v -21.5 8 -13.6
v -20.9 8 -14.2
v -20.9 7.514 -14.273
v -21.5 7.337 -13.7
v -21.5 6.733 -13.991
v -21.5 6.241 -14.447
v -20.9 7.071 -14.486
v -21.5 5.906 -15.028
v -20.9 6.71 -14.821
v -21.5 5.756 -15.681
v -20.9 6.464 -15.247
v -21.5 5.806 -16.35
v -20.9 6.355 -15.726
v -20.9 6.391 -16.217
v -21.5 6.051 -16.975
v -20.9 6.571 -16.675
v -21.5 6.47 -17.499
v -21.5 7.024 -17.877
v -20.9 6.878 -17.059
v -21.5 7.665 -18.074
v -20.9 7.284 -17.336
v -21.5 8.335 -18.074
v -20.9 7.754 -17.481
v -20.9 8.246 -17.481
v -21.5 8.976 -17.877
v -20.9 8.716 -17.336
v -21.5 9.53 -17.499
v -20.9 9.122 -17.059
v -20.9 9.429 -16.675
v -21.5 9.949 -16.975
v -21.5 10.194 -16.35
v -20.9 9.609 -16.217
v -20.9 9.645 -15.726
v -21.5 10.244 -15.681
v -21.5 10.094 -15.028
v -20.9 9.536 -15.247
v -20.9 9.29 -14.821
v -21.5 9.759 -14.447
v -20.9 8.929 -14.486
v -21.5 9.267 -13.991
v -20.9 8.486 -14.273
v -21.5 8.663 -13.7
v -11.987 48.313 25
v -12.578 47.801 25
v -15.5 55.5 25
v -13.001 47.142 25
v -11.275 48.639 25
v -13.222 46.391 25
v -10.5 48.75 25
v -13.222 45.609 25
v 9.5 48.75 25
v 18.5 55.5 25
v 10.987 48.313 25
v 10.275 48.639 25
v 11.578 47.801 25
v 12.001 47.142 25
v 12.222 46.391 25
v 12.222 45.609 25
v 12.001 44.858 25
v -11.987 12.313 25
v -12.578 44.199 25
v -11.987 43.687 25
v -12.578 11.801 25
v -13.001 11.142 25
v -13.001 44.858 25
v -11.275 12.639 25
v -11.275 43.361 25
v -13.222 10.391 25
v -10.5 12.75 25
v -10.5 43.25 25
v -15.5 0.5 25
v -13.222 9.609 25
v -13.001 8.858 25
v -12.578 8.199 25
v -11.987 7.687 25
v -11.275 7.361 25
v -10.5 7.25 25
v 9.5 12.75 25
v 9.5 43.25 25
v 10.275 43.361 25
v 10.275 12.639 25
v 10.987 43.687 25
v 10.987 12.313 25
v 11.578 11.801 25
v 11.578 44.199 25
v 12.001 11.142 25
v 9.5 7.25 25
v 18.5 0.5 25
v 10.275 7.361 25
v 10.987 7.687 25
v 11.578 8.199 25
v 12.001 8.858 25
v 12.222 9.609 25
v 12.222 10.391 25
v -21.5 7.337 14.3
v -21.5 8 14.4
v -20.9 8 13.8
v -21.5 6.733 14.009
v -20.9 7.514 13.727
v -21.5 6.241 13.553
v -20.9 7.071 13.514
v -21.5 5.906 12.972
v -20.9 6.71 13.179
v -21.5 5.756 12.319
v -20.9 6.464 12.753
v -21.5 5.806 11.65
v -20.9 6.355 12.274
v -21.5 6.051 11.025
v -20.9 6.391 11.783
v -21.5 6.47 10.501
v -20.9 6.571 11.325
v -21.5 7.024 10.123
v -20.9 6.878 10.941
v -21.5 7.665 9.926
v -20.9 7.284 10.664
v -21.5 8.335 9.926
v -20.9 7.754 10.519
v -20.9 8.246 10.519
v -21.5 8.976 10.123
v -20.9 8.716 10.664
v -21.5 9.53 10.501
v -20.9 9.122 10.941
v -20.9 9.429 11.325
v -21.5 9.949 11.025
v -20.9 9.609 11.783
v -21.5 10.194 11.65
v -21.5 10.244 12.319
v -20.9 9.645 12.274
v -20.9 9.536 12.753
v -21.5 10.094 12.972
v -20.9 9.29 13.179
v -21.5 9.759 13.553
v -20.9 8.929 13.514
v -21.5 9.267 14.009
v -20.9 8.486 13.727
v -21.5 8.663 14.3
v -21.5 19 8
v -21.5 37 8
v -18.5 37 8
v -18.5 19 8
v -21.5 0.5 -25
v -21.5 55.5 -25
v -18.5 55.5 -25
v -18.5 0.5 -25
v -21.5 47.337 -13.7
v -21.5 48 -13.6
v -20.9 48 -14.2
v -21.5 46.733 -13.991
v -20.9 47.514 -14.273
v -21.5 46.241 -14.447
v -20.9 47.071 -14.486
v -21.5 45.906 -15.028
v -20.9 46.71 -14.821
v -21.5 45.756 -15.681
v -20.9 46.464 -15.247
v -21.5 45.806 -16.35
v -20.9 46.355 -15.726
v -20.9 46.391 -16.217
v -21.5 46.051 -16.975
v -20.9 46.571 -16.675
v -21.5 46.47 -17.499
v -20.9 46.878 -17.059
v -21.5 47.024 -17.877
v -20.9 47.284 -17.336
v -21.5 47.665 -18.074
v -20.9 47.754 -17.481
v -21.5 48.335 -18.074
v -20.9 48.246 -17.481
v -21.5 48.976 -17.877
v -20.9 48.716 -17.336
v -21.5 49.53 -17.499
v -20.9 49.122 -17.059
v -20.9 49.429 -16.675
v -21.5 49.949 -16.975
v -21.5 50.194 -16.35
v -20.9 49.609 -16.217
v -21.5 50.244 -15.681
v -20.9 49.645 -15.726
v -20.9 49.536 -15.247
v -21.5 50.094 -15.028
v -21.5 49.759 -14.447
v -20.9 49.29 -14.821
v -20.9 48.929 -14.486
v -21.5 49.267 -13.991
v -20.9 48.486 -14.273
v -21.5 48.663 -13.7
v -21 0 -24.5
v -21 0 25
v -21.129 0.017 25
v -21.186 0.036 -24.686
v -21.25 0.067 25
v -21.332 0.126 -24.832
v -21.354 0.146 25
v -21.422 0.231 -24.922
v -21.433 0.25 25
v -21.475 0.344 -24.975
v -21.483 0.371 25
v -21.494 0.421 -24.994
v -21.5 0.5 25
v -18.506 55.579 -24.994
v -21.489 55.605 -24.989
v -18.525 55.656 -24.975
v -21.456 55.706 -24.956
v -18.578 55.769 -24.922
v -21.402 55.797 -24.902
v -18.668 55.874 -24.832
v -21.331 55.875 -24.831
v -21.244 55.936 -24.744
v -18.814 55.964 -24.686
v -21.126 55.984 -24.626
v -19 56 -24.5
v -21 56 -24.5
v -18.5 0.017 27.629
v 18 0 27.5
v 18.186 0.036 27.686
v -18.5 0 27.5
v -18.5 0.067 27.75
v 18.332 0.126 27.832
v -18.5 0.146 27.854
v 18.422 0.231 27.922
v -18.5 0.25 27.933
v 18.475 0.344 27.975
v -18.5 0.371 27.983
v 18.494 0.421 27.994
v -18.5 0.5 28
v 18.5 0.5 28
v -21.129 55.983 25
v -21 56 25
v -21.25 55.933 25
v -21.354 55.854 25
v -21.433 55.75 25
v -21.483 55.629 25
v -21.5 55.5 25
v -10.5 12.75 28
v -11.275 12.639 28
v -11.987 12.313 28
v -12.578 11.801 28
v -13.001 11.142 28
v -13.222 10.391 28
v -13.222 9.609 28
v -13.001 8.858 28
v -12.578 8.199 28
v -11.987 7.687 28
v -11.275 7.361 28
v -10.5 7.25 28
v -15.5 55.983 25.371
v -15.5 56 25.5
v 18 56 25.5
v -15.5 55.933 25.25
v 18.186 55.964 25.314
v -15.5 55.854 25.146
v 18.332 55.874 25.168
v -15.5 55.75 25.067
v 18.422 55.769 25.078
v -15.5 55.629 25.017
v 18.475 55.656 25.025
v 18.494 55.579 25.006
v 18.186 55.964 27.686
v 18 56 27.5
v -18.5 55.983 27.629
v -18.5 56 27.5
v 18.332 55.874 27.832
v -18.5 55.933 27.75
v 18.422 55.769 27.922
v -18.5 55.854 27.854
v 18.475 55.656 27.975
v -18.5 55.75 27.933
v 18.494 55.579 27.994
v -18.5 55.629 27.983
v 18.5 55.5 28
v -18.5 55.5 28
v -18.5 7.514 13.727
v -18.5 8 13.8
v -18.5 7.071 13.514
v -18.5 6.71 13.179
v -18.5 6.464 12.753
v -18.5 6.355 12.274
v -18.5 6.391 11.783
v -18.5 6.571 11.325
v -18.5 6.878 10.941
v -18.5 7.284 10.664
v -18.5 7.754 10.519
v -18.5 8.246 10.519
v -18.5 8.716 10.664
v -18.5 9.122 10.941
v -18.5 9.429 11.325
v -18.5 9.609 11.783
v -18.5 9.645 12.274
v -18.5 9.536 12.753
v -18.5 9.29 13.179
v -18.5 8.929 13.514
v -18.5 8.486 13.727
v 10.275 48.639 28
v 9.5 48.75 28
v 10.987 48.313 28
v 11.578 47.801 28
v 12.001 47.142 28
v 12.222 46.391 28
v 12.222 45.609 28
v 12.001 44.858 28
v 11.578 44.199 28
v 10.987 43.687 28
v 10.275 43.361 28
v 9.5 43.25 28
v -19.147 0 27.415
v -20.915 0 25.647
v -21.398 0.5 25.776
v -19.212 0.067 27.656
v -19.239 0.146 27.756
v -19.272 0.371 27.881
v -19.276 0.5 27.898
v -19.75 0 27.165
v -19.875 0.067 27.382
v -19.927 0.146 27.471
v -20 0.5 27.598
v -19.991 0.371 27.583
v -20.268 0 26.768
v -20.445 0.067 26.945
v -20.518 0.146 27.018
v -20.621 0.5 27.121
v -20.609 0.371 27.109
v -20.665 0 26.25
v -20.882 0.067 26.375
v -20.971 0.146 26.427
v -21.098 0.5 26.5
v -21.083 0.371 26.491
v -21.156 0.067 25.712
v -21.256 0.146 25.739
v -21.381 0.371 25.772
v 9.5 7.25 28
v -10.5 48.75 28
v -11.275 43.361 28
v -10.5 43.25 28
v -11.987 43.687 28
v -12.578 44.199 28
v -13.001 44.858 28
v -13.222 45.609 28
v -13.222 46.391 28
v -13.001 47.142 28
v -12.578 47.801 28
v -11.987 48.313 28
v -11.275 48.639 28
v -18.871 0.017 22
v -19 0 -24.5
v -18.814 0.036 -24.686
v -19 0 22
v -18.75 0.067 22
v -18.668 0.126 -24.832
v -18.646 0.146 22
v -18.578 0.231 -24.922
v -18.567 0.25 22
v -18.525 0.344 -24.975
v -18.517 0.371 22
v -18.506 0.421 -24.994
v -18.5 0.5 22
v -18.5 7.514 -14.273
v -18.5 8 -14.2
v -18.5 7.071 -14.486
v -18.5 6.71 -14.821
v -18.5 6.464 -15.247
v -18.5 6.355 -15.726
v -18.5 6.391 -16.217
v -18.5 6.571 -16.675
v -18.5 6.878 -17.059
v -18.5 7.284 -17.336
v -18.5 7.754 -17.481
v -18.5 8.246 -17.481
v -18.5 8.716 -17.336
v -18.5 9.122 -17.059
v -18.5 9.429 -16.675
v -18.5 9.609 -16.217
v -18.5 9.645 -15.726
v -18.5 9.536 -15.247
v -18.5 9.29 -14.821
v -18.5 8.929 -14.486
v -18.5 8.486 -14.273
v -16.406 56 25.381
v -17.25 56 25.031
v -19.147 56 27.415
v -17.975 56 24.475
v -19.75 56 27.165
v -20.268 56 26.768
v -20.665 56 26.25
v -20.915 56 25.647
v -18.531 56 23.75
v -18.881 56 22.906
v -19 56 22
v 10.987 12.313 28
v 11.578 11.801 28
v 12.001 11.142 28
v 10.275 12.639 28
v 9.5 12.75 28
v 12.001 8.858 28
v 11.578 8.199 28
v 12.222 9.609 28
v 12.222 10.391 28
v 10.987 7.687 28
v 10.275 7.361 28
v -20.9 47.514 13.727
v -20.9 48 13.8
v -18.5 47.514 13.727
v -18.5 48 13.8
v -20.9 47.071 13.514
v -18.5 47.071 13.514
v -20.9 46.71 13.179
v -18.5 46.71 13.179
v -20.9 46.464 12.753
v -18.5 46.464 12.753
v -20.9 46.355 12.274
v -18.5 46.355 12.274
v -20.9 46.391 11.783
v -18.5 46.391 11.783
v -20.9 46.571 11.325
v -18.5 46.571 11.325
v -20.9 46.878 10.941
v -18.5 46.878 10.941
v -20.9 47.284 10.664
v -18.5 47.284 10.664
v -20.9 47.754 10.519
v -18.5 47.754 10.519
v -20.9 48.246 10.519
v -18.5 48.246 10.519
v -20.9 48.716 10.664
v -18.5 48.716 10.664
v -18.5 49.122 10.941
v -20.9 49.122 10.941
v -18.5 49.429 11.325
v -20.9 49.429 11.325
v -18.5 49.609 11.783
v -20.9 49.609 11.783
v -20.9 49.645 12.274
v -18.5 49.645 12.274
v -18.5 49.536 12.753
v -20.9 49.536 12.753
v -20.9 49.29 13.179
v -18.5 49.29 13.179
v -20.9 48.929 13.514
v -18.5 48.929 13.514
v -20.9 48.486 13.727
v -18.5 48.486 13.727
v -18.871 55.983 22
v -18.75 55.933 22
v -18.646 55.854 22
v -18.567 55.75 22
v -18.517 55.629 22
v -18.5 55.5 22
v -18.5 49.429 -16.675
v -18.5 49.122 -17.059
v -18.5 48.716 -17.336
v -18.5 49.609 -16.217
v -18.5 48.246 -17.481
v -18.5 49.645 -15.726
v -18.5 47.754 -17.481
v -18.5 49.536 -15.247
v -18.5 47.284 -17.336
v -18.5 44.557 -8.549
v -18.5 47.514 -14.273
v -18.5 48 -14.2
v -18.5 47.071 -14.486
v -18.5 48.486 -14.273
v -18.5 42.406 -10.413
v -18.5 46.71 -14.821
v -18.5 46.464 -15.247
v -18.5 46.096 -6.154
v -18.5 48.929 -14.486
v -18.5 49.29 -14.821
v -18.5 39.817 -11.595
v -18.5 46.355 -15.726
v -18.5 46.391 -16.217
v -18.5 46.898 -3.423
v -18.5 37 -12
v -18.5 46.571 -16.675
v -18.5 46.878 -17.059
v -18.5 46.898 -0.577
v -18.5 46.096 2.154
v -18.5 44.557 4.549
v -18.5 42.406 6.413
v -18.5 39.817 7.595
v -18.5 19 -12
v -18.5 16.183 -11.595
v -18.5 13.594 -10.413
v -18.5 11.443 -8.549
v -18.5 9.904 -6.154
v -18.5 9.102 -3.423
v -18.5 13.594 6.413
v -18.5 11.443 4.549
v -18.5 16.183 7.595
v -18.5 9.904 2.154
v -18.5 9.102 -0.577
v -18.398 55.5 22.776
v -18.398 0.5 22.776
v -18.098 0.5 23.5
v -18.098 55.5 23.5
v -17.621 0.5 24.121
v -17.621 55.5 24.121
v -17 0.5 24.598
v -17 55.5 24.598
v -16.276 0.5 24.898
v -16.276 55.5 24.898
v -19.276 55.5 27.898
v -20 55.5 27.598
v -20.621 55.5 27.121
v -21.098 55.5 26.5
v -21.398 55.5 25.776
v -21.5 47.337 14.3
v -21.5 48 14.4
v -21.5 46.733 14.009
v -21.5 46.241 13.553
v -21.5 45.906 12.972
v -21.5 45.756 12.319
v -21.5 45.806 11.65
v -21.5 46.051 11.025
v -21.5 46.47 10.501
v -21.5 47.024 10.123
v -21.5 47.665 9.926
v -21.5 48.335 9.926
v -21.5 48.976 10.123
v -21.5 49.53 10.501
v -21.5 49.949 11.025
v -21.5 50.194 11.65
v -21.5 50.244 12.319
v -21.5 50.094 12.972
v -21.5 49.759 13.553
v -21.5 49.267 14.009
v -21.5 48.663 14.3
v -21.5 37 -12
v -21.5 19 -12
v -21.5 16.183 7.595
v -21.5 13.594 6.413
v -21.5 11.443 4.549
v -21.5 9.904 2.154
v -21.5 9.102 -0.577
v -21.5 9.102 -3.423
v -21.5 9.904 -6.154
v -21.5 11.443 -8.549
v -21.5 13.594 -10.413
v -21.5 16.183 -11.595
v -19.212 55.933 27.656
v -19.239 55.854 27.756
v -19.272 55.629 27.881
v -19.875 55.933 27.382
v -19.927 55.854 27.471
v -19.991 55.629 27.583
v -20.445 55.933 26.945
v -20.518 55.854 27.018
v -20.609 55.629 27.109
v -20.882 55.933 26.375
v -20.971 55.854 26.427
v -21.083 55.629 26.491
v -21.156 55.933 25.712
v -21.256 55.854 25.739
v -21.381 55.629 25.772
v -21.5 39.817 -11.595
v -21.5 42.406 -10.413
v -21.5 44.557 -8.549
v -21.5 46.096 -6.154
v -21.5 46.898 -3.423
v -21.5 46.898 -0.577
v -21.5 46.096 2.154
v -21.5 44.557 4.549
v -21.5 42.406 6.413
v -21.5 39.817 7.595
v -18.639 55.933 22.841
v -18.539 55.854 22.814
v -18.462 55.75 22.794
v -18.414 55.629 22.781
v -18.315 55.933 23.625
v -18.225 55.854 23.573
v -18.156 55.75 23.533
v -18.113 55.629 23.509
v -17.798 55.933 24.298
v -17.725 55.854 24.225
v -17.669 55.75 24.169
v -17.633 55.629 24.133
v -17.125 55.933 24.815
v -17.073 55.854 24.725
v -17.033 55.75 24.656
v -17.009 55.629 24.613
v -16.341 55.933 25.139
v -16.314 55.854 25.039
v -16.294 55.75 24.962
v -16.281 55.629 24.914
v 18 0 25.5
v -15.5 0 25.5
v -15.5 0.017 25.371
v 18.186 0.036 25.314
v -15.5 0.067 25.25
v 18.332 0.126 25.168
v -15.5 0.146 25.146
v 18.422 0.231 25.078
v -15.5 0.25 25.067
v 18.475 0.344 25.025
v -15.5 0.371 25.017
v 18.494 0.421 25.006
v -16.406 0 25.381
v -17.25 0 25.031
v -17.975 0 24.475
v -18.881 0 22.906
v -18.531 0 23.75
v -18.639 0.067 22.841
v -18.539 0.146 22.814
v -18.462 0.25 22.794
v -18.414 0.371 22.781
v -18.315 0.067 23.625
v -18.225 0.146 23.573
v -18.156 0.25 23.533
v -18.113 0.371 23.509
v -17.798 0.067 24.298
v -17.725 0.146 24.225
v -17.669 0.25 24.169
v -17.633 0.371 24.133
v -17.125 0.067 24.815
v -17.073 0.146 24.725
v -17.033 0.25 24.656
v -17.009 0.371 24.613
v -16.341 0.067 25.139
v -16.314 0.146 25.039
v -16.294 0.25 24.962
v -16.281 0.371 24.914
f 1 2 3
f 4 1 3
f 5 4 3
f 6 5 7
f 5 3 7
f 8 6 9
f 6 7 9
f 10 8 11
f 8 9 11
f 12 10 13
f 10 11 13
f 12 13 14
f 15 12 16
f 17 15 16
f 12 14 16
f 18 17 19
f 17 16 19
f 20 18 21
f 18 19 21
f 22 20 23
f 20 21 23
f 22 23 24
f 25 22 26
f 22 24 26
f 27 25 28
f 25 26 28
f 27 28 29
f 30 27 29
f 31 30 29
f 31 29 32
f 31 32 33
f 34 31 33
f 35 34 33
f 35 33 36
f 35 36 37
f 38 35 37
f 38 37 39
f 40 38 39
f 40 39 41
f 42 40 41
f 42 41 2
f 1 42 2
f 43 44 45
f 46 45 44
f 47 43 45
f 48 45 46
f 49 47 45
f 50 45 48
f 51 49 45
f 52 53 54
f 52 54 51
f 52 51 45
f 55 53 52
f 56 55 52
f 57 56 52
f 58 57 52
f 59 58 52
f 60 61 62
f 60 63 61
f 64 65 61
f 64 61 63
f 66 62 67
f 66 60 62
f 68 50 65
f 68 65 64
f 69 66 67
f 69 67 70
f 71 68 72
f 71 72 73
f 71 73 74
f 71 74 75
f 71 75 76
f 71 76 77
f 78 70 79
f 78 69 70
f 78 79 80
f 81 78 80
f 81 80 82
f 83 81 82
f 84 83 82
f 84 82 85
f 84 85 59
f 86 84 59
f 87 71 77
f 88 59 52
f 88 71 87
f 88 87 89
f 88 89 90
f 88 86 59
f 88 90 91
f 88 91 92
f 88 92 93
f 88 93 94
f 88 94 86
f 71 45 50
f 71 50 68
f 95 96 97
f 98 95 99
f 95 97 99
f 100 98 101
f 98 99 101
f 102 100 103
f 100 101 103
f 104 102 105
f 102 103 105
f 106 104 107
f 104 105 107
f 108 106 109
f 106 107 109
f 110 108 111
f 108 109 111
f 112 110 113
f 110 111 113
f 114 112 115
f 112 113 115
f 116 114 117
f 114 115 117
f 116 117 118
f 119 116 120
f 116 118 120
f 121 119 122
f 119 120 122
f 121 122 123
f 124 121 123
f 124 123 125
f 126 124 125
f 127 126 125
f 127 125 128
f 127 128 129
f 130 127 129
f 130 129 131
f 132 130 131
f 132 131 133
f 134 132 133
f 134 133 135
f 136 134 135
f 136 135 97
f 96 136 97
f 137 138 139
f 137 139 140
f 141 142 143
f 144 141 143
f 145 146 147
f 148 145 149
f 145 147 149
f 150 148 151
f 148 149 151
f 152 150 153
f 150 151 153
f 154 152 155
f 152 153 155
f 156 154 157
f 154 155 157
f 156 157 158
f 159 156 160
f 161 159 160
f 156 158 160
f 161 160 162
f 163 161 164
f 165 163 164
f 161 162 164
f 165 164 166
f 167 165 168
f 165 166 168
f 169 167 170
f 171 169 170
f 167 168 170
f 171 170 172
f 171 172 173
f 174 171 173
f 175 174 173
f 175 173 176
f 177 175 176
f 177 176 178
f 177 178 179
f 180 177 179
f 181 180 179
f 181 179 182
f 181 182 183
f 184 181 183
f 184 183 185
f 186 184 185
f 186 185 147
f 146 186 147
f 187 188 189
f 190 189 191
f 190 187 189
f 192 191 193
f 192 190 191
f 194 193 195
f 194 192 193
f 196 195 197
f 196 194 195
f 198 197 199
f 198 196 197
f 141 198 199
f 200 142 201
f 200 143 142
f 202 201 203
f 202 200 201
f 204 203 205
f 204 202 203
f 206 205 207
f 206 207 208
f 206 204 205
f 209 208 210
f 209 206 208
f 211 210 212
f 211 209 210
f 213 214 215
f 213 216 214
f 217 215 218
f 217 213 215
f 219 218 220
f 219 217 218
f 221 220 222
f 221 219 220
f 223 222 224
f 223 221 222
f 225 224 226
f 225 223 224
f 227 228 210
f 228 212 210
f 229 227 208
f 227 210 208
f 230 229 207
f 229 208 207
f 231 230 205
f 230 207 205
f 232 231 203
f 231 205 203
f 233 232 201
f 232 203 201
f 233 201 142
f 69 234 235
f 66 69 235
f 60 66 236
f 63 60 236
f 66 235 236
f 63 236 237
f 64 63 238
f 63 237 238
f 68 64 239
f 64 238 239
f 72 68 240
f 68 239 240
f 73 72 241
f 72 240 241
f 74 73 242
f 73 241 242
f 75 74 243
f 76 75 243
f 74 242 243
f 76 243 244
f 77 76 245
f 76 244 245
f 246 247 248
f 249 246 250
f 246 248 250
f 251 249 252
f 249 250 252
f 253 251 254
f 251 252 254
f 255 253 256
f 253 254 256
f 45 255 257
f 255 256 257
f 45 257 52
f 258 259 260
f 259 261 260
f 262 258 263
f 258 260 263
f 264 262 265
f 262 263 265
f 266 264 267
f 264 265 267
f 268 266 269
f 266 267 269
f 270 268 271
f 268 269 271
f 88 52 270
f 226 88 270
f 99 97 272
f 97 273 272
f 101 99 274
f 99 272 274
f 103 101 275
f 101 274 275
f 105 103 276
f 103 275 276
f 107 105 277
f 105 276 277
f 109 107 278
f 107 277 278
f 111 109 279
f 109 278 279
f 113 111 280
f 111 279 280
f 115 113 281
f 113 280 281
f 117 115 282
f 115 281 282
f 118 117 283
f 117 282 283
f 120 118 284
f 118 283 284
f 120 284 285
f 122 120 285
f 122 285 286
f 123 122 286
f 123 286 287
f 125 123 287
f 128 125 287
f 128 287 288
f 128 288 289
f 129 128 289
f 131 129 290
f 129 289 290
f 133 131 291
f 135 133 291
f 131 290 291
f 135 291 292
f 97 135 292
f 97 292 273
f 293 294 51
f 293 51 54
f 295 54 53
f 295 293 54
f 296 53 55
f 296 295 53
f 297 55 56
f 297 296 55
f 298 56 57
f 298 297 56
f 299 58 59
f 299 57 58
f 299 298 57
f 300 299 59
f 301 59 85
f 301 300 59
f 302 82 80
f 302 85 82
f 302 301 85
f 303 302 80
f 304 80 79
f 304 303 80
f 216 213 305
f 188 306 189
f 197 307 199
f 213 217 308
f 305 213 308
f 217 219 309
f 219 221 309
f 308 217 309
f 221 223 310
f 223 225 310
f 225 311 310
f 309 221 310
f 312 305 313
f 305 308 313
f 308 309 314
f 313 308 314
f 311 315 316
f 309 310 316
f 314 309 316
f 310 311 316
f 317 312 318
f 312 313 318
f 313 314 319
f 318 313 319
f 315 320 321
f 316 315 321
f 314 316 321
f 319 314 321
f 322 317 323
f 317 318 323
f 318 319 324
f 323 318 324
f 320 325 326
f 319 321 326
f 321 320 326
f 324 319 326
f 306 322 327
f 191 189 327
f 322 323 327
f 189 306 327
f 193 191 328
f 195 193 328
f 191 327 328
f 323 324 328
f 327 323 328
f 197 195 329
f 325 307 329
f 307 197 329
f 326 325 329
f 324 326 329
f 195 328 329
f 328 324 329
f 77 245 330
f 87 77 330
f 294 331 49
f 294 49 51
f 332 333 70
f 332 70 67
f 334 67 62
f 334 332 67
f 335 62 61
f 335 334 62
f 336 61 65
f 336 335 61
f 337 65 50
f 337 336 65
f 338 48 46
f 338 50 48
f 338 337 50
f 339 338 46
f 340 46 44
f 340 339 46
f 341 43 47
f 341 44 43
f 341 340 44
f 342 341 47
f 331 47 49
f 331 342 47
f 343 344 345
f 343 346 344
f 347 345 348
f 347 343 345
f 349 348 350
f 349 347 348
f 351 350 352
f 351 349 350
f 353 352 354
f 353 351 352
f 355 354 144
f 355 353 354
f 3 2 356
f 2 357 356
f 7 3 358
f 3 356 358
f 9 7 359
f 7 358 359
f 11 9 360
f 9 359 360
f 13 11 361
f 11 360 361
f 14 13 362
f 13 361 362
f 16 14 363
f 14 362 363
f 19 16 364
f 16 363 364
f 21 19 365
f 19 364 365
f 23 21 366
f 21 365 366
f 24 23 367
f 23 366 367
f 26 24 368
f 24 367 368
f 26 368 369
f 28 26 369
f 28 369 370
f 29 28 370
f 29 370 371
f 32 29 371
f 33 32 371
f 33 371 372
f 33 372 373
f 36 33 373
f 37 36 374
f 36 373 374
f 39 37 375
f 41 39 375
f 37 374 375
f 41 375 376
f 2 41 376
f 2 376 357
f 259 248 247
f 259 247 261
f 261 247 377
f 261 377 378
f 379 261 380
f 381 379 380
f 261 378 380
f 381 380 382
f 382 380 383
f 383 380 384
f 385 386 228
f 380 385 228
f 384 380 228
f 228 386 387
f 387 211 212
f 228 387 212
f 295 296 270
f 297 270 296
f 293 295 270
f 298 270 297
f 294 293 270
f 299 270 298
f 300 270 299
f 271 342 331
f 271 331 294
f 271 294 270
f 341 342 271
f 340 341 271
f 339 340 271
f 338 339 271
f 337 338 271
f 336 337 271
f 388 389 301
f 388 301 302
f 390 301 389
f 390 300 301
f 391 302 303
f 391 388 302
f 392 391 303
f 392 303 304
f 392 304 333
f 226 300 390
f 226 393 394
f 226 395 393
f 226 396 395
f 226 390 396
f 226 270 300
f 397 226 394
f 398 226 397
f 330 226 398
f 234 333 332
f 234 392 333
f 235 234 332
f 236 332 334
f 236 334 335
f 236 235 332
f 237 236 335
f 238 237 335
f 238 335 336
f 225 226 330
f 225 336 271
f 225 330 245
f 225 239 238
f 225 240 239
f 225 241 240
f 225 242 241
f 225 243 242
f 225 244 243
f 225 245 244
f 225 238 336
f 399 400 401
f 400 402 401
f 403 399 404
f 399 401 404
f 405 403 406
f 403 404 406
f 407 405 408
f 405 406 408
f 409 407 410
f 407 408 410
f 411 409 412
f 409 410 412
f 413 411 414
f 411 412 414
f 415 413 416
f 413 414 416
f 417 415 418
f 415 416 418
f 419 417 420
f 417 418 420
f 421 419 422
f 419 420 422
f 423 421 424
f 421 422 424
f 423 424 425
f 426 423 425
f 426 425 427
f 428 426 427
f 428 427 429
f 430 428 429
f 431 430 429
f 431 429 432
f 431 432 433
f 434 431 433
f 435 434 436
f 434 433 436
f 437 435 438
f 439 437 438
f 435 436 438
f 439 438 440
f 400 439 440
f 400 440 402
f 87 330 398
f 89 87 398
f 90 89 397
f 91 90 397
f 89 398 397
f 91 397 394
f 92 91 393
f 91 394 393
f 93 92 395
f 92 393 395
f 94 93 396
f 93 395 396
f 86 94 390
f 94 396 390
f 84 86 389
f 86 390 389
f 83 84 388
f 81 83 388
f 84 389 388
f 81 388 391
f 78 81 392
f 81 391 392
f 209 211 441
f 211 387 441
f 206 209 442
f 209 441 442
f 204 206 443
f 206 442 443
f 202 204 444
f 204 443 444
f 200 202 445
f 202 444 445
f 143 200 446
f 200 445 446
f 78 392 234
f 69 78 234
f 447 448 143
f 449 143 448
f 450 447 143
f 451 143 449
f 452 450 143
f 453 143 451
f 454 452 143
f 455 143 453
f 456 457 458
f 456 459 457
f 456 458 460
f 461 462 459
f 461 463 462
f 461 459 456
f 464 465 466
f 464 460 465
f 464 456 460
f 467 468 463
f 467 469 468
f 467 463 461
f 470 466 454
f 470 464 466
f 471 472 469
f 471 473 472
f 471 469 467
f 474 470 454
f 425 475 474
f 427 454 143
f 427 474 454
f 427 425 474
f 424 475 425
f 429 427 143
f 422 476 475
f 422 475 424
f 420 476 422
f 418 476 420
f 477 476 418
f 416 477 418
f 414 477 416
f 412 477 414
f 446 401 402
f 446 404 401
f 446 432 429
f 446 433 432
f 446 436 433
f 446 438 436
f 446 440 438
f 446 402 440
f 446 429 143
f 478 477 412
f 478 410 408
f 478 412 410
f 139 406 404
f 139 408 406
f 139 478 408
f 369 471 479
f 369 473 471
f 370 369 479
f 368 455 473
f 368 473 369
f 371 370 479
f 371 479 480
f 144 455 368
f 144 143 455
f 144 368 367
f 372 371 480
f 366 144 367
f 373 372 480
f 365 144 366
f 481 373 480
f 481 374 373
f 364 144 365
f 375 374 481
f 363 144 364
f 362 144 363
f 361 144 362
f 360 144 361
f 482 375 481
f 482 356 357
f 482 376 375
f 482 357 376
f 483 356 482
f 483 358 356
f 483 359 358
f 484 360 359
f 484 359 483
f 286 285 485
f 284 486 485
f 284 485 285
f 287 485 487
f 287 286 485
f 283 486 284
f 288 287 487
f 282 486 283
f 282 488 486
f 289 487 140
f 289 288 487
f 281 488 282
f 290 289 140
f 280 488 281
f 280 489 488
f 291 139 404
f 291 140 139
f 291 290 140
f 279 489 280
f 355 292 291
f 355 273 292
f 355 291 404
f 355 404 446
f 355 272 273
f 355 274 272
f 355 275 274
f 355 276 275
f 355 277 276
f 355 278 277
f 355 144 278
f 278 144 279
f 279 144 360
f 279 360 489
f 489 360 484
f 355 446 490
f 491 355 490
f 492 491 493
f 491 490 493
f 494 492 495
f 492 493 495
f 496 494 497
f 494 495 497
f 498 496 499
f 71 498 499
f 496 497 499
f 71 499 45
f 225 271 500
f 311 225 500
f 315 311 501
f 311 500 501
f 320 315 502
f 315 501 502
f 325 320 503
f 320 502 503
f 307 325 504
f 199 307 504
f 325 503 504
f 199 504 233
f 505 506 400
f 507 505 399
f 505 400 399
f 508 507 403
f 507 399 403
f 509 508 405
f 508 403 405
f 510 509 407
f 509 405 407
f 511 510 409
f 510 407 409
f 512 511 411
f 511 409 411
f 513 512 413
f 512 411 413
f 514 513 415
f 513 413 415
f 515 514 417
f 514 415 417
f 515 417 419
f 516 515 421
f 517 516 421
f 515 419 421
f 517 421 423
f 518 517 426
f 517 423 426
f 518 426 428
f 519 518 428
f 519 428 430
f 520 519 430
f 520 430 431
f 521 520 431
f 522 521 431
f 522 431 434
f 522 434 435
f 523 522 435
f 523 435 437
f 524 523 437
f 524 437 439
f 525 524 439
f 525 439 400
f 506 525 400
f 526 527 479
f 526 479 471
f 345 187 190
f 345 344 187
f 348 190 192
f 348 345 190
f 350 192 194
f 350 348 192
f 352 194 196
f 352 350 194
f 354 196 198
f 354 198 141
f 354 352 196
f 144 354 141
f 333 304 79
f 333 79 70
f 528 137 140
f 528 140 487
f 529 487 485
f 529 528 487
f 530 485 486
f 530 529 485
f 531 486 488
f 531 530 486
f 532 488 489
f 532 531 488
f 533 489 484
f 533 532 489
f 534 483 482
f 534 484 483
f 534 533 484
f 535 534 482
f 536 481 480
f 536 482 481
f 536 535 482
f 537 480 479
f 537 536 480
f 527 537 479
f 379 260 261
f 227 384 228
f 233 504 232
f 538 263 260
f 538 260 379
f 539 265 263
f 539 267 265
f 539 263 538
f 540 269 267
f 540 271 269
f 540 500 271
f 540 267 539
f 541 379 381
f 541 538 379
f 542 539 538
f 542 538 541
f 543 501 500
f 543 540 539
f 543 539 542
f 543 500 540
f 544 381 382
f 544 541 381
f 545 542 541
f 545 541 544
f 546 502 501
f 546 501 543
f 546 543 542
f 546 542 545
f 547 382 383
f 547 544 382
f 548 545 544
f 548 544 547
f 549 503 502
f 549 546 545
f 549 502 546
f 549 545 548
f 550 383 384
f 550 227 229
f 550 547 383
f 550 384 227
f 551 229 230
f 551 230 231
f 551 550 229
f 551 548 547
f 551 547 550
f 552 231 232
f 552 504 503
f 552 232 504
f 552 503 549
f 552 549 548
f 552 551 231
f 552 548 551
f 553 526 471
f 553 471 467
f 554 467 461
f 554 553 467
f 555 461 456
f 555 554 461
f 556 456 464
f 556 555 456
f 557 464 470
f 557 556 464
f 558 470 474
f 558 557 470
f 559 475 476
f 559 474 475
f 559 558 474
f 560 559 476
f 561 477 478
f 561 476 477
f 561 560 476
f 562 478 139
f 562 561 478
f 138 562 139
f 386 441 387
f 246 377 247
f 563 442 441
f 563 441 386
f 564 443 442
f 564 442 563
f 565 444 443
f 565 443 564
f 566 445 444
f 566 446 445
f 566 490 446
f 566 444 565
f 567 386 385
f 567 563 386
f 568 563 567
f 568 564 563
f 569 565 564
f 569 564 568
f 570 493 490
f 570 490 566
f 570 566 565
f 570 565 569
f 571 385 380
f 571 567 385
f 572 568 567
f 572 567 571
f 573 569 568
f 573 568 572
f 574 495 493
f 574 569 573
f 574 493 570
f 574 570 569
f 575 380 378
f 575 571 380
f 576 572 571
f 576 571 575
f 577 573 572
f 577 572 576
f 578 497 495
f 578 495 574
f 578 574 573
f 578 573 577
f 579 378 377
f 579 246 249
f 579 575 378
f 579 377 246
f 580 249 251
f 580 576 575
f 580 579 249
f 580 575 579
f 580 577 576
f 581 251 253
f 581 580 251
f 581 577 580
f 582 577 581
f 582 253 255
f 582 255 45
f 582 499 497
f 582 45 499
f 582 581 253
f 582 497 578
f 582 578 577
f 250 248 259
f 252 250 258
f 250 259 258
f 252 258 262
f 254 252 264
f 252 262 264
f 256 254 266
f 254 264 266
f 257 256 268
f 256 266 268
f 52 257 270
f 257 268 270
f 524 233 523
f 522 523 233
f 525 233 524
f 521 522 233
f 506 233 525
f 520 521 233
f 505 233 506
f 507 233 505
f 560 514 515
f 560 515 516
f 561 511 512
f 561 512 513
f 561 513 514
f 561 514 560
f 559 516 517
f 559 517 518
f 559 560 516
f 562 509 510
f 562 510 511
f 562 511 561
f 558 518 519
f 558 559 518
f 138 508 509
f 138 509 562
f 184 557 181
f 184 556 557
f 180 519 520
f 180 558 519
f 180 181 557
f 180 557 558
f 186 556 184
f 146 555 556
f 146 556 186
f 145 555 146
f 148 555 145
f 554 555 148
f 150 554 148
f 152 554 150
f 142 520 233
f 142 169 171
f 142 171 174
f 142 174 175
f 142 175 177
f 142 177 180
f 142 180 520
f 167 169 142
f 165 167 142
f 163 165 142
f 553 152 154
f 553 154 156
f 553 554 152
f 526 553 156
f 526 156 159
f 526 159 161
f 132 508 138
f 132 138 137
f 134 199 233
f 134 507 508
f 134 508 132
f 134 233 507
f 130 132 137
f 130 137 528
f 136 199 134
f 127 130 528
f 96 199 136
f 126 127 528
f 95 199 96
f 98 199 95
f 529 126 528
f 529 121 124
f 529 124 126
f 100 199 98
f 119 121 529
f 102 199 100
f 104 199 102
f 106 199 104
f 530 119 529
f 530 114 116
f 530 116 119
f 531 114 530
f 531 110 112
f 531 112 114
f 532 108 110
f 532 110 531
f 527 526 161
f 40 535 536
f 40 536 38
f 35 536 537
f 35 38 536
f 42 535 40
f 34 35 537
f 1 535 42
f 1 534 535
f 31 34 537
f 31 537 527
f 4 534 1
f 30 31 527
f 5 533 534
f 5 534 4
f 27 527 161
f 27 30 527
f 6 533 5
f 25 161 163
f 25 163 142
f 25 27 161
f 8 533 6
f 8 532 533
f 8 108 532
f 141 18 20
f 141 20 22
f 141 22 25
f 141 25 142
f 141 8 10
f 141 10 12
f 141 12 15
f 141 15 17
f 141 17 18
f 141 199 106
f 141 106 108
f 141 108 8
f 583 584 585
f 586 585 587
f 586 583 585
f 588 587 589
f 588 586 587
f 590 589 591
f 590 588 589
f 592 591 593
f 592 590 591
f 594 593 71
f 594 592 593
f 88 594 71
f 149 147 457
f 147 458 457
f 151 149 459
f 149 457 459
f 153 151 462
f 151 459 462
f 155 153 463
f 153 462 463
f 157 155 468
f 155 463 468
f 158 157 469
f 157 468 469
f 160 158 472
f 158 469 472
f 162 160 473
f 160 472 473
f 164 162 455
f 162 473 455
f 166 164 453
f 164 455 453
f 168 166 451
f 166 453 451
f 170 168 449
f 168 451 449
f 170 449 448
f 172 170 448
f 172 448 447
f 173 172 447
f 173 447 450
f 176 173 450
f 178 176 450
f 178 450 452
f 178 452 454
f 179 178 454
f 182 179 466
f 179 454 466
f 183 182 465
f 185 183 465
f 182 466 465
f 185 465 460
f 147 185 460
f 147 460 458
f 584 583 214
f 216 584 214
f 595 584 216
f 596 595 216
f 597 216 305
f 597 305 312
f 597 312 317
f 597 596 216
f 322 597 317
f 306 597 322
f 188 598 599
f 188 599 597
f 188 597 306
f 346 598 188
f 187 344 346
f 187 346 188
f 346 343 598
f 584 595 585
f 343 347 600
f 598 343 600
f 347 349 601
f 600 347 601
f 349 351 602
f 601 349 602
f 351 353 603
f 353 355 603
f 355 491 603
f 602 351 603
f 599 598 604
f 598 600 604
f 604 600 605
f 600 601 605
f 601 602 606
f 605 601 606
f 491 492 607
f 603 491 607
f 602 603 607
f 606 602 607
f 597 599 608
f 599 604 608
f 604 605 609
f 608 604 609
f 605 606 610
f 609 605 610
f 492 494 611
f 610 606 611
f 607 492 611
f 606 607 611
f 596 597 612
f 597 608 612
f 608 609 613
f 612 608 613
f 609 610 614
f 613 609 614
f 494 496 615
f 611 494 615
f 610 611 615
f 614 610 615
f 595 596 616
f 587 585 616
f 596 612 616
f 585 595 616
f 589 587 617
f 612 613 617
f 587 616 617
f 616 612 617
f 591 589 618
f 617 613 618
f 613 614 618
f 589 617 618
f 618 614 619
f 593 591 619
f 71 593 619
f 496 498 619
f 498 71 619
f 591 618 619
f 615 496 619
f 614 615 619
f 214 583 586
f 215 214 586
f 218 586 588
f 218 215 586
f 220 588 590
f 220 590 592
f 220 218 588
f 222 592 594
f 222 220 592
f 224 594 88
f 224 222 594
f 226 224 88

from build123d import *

# Parameters (mm, degrees)
EXTRUDE_1_DEPTH              = 56
FILLET_1_R                   = 3
FILLET_2_R                   = 0.5
CUT_EXTRUDE_1_REACH          = 82.045
CUT_EXTRUDE_2_REACH          = 76.297
HOLE_WIZARD_M4_1_D           = 3.3
HOLE_WIZARD_M4_1_CSINK_D     = 4.5
HOLE_WIZARD_M4_1_CSINK_ANGLE = 90


with BuildPart() as part:
    # 草图1 → 拉伸-薄壁1 (new body)
    with BuildSketch(Plane(origin=(0, 0, 0), x_dir=(1, 0, 0), z_dir=(0, 1, 0))):
        Polygon((-18.5, 25), (-18.5, -25), (18.5, -25), (18.5, -28), (-21.5, -28), (-21.5, 25), align=None)
    extrude(amount=EXTRUDE_1_DEPTH)

    # 圆角1
    fillet_1_edges = [part.edges().sort_by_distance(p)[0] for p in [
        (-21.5, 28, 28),
        (-18.5, 28, 25),
    ]]
    fillet(fillet_1_edges, radius=FILLET_1_R)

    # 圆角2
    fillet_2_edges = [part.edges().sort_by_distance(p)[0] for p in [
        (0, 0, 28),
        (18.5, 0, 26.5),
        (1.5, 0, 25),
        (-18.5, 0, -1.5),
        (-20, 0, -25),
        (-21.5, 0, 0),
        (18.5, 56, 26.5),
        (1.5, 56, 25),
        (-18.5, 56, -1.5),
        (-20, 56, -25),
        (-21.5, 56, 0),
        (0, 56, 28),
        (-20.621320344, 0, 27.121320344),
        (-20.621320344, 56, 27.121320344),
    ]]
    fillet(fillet_2_edges, radius=FILLET_2_R)

    # 草图2 → 切除-拉伸1 (cut, up to next)
    with BuildSketch(Plane.XY.offset(28), mode=Mode.PRIVATE) as cut_extrude_1_sk1:
        with BuildLine():
            Line((-10.5, 48.75), (9.5, 48.75))
            ThreePointArc((9.5, 48.75), (12.25, 46), (9.5, 43.25))
            Line((9.5, 43.25), (-10.5, 43.25))
            ThreePointArc((-10.5, 43.25), (-13.25, 46), (-10.5, 48.75))
        make_face()
    cut_extrude_1_tool1 = extrude(cut_extrude_1_sk1.sketch, amount=-CUT_EXTRUDE_1_REACH, mode=Mode.PRIVATE) & part.part
    # 草图2 → 切除-拉伸1 (cut, up to next)
    with BuildSketch(Plane.XY.offset(28), mode=Mode.PRIVATE) as cut_extrude_1_sk2:
        with BuildLine():
            Line((-10.5, 7.25), (9.5, 7.25))
            ThreePointArc((9.5, 7.25), (12.25, 10), (9.5, 12.75))
            Line((9.5, 12.75), (-10.5, 12.75))
            ThreePointArc((-10.5, 12.75), (-13.25, 10), (-10.5, 7.25))
        make_face()
    cut_extrude_1_tool2 = extrude(cut_extrude_1_sk2.sketch, amount=-CUT_EXTRUDE_1_REACH, mode=Mode.PRIVATE) & part.part
    add(cut_extrude_1_tool1.solids().sort_by_distance((-0.5, 46, 28))[0], mode=Mode.SUBTRACT)
    add(cut_extrude_1_tool2.solids().sort_by_distance((-0.5, 10, 28))[0], mode=Mode.SUBTRACT)

    # 草图3 → 切除-拉伸2 (cut, up to next)
    with BuildSketch(Plane.ZY.offset(21.5), mode=Mode.PRIVATE) as cut_extrude_2_sk1:
        with BuildLine():
            Line((-12, 19), (-12, 37))
            ThreePointArc((-12, 37), (-2, 47), (8, 37))
            Line((8, 37), (8, 19))
            ThreePointArc((8, 19), (-2, 9), (-12, 19))
        make_face()
    cut_extrude_2_tool1 = extrude(cut_extrude_2_sk1.sketch, amount=-CUT_EXTRUDE_2_REACH, mode=Mode.PRIVATE) & part.part
    add(cut_extrude_2_tool1.solids().sort_by_distance((-21.5, 28, -2))[0], mode=Mode.SUBTRACT)

    # M4 螺纹孔1 (through all)
    with Locations(Plane(origin=(-21.5, 8, -15.849623113), x_dir=(0, 0, -1), z_dir=(-1, 0, 0))):
        with Locations((0, 0), (-14, -20), (0, -40), (-28, -40), (-28, 0)):
            CounterSinkHole(HOLE_WIZARD_M4_1_D / 2, HOLE_WIZARD_M4_1_CSINK_D / 2, counter_sink_angle=HOLE_WIZARD_M4_1_CSINK_ANGLE)


solid = part.part
